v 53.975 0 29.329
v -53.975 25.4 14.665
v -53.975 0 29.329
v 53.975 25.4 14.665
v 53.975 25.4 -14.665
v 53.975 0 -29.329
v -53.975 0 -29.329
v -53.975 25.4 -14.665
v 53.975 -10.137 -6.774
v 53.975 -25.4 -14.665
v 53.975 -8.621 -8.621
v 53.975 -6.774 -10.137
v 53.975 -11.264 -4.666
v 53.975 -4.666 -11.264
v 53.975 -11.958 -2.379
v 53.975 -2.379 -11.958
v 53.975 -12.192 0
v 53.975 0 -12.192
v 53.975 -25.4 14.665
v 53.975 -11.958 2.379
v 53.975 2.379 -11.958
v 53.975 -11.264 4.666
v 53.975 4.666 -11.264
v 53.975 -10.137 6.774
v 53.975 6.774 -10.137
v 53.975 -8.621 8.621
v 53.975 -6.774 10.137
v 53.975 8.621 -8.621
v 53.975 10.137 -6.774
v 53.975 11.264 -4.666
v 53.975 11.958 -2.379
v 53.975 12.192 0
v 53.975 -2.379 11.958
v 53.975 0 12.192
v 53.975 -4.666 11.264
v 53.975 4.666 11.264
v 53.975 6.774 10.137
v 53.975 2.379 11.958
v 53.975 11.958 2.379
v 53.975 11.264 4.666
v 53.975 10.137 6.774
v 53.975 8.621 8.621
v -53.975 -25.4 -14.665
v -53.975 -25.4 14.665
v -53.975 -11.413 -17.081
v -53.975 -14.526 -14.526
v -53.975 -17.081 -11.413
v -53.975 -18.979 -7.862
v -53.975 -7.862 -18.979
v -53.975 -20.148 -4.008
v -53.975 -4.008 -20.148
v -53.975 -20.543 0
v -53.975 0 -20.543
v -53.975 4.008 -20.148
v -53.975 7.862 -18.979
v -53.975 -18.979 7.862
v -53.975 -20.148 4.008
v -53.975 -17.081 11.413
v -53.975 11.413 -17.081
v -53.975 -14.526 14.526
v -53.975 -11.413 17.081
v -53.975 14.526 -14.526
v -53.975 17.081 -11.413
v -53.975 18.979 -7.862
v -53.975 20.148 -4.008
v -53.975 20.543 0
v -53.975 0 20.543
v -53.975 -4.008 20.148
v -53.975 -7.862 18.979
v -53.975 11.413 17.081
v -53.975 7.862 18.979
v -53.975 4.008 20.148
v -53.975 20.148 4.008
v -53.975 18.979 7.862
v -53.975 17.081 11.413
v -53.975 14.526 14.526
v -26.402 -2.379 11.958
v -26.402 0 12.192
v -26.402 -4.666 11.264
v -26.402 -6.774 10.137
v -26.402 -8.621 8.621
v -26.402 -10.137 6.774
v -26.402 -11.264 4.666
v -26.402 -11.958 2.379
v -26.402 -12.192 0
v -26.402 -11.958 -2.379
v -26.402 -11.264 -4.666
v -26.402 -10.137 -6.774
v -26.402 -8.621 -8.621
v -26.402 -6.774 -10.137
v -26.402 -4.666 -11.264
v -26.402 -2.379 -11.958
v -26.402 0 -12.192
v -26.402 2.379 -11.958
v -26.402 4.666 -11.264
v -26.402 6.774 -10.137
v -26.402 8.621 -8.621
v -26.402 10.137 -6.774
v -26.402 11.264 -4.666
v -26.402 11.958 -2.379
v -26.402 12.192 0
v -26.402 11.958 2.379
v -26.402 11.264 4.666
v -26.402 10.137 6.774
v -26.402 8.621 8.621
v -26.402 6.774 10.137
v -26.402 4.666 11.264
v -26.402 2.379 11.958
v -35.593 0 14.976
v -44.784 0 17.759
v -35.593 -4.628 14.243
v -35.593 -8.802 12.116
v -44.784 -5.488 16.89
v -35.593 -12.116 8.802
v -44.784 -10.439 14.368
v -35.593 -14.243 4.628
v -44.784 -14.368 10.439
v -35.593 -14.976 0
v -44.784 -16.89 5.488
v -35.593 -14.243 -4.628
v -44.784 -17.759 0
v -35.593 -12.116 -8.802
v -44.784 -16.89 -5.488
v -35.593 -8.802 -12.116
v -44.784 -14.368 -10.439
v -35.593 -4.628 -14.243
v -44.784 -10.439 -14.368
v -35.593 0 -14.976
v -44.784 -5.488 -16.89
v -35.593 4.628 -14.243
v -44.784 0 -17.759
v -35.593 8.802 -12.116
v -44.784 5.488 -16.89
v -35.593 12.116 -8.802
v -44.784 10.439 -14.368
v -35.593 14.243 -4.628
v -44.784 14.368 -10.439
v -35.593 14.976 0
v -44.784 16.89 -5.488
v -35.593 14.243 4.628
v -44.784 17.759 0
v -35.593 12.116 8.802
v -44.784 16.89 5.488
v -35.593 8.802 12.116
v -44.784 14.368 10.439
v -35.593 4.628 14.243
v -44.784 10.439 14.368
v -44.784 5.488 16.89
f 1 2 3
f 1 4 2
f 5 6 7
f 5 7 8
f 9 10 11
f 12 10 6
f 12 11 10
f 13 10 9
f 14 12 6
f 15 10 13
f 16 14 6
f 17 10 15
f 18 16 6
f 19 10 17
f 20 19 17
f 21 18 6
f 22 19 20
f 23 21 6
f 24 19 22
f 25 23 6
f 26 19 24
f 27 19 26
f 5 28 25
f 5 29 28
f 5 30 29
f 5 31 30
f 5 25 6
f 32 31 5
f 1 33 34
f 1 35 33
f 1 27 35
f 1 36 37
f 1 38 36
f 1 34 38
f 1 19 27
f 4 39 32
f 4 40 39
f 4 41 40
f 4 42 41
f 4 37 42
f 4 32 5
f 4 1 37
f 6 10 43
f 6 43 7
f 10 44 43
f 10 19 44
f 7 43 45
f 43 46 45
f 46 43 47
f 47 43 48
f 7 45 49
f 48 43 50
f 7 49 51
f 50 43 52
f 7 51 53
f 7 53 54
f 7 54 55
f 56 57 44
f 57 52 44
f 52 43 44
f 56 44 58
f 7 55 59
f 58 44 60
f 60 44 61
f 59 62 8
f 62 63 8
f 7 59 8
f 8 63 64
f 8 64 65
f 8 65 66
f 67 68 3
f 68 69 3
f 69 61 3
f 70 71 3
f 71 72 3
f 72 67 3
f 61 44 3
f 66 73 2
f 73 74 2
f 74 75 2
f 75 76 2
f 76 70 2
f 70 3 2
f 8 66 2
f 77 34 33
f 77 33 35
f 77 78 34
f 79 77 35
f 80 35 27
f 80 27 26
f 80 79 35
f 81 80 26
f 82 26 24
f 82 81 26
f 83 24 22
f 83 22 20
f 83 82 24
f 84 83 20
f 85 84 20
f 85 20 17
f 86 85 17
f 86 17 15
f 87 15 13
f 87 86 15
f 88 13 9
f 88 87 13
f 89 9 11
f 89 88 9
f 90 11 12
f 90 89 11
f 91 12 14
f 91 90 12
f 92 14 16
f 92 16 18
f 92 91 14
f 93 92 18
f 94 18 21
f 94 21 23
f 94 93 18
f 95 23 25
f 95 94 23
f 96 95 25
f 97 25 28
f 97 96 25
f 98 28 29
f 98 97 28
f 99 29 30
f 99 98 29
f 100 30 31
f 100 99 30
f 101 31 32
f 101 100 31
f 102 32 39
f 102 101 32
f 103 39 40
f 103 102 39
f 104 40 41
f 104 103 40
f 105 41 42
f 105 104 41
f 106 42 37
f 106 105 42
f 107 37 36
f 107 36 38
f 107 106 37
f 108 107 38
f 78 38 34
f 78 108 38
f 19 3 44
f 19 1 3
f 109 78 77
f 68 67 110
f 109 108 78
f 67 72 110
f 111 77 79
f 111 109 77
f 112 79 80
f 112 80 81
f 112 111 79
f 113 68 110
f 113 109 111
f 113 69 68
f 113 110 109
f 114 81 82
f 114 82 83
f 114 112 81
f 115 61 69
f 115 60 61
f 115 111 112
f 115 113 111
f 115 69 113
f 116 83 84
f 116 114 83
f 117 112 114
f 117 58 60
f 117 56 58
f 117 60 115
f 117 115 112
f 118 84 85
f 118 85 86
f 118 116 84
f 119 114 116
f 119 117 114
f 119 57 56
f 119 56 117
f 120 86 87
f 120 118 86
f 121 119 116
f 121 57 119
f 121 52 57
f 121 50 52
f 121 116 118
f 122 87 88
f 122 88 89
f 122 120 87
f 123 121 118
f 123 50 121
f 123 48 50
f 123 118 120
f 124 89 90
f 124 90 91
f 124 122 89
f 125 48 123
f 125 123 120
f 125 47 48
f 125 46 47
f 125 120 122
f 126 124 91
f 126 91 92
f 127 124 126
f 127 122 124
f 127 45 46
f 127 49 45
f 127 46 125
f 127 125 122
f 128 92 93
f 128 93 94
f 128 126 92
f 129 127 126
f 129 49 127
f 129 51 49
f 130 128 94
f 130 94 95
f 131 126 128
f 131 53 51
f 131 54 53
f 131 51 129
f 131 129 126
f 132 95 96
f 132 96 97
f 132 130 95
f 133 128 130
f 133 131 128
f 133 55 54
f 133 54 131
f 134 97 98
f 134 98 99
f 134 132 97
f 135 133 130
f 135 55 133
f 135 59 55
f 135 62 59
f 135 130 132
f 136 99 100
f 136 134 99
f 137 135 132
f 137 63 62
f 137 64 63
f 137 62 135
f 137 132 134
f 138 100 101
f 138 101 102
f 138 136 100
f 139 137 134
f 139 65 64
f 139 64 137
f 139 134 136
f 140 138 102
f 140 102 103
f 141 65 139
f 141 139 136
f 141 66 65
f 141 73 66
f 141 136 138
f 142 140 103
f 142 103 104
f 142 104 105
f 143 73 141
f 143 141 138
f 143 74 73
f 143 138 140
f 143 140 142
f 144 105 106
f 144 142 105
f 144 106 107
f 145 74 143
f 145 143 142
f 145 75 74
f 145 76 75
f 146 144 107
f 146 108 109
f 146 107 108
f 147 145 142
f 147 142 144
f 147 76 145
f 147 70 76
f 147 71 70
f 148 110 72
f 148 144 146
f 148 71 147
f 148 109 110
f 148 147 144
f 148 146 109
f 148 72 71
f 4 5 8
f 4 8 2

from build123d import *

# Parameters (mm, degrees)
F1_DEPTH = 53.975


with BuildPart() as f1:
    # F0 (on Right) → F1 (new body, symmetric)
    with BuildSketch(Plane.YZ):
        Polygon((-25.4, 14.664697), (-25.4, -14.664697), (0, -29.329394), (25.4, -14.664697), (25.4, 14.664697), (0, 29.329394), align=None)
    extrude(amount=F1_DEPTH, both=True)

    # F2 (on Front) → F3 (revolve, cut)
    with BuildSketch(Plane.XZ):
        Polygon((-53.975, 0), (53.975, 0), (53.975, 12.192), (-26.401746, 12.192), (-53.975, 20.543119), align=None)
    revolve(axis=Axis((-0.356656, 0, 0), (1, 0, 0)), mode=Mode.SUBTRACT)


solid = f1.part
